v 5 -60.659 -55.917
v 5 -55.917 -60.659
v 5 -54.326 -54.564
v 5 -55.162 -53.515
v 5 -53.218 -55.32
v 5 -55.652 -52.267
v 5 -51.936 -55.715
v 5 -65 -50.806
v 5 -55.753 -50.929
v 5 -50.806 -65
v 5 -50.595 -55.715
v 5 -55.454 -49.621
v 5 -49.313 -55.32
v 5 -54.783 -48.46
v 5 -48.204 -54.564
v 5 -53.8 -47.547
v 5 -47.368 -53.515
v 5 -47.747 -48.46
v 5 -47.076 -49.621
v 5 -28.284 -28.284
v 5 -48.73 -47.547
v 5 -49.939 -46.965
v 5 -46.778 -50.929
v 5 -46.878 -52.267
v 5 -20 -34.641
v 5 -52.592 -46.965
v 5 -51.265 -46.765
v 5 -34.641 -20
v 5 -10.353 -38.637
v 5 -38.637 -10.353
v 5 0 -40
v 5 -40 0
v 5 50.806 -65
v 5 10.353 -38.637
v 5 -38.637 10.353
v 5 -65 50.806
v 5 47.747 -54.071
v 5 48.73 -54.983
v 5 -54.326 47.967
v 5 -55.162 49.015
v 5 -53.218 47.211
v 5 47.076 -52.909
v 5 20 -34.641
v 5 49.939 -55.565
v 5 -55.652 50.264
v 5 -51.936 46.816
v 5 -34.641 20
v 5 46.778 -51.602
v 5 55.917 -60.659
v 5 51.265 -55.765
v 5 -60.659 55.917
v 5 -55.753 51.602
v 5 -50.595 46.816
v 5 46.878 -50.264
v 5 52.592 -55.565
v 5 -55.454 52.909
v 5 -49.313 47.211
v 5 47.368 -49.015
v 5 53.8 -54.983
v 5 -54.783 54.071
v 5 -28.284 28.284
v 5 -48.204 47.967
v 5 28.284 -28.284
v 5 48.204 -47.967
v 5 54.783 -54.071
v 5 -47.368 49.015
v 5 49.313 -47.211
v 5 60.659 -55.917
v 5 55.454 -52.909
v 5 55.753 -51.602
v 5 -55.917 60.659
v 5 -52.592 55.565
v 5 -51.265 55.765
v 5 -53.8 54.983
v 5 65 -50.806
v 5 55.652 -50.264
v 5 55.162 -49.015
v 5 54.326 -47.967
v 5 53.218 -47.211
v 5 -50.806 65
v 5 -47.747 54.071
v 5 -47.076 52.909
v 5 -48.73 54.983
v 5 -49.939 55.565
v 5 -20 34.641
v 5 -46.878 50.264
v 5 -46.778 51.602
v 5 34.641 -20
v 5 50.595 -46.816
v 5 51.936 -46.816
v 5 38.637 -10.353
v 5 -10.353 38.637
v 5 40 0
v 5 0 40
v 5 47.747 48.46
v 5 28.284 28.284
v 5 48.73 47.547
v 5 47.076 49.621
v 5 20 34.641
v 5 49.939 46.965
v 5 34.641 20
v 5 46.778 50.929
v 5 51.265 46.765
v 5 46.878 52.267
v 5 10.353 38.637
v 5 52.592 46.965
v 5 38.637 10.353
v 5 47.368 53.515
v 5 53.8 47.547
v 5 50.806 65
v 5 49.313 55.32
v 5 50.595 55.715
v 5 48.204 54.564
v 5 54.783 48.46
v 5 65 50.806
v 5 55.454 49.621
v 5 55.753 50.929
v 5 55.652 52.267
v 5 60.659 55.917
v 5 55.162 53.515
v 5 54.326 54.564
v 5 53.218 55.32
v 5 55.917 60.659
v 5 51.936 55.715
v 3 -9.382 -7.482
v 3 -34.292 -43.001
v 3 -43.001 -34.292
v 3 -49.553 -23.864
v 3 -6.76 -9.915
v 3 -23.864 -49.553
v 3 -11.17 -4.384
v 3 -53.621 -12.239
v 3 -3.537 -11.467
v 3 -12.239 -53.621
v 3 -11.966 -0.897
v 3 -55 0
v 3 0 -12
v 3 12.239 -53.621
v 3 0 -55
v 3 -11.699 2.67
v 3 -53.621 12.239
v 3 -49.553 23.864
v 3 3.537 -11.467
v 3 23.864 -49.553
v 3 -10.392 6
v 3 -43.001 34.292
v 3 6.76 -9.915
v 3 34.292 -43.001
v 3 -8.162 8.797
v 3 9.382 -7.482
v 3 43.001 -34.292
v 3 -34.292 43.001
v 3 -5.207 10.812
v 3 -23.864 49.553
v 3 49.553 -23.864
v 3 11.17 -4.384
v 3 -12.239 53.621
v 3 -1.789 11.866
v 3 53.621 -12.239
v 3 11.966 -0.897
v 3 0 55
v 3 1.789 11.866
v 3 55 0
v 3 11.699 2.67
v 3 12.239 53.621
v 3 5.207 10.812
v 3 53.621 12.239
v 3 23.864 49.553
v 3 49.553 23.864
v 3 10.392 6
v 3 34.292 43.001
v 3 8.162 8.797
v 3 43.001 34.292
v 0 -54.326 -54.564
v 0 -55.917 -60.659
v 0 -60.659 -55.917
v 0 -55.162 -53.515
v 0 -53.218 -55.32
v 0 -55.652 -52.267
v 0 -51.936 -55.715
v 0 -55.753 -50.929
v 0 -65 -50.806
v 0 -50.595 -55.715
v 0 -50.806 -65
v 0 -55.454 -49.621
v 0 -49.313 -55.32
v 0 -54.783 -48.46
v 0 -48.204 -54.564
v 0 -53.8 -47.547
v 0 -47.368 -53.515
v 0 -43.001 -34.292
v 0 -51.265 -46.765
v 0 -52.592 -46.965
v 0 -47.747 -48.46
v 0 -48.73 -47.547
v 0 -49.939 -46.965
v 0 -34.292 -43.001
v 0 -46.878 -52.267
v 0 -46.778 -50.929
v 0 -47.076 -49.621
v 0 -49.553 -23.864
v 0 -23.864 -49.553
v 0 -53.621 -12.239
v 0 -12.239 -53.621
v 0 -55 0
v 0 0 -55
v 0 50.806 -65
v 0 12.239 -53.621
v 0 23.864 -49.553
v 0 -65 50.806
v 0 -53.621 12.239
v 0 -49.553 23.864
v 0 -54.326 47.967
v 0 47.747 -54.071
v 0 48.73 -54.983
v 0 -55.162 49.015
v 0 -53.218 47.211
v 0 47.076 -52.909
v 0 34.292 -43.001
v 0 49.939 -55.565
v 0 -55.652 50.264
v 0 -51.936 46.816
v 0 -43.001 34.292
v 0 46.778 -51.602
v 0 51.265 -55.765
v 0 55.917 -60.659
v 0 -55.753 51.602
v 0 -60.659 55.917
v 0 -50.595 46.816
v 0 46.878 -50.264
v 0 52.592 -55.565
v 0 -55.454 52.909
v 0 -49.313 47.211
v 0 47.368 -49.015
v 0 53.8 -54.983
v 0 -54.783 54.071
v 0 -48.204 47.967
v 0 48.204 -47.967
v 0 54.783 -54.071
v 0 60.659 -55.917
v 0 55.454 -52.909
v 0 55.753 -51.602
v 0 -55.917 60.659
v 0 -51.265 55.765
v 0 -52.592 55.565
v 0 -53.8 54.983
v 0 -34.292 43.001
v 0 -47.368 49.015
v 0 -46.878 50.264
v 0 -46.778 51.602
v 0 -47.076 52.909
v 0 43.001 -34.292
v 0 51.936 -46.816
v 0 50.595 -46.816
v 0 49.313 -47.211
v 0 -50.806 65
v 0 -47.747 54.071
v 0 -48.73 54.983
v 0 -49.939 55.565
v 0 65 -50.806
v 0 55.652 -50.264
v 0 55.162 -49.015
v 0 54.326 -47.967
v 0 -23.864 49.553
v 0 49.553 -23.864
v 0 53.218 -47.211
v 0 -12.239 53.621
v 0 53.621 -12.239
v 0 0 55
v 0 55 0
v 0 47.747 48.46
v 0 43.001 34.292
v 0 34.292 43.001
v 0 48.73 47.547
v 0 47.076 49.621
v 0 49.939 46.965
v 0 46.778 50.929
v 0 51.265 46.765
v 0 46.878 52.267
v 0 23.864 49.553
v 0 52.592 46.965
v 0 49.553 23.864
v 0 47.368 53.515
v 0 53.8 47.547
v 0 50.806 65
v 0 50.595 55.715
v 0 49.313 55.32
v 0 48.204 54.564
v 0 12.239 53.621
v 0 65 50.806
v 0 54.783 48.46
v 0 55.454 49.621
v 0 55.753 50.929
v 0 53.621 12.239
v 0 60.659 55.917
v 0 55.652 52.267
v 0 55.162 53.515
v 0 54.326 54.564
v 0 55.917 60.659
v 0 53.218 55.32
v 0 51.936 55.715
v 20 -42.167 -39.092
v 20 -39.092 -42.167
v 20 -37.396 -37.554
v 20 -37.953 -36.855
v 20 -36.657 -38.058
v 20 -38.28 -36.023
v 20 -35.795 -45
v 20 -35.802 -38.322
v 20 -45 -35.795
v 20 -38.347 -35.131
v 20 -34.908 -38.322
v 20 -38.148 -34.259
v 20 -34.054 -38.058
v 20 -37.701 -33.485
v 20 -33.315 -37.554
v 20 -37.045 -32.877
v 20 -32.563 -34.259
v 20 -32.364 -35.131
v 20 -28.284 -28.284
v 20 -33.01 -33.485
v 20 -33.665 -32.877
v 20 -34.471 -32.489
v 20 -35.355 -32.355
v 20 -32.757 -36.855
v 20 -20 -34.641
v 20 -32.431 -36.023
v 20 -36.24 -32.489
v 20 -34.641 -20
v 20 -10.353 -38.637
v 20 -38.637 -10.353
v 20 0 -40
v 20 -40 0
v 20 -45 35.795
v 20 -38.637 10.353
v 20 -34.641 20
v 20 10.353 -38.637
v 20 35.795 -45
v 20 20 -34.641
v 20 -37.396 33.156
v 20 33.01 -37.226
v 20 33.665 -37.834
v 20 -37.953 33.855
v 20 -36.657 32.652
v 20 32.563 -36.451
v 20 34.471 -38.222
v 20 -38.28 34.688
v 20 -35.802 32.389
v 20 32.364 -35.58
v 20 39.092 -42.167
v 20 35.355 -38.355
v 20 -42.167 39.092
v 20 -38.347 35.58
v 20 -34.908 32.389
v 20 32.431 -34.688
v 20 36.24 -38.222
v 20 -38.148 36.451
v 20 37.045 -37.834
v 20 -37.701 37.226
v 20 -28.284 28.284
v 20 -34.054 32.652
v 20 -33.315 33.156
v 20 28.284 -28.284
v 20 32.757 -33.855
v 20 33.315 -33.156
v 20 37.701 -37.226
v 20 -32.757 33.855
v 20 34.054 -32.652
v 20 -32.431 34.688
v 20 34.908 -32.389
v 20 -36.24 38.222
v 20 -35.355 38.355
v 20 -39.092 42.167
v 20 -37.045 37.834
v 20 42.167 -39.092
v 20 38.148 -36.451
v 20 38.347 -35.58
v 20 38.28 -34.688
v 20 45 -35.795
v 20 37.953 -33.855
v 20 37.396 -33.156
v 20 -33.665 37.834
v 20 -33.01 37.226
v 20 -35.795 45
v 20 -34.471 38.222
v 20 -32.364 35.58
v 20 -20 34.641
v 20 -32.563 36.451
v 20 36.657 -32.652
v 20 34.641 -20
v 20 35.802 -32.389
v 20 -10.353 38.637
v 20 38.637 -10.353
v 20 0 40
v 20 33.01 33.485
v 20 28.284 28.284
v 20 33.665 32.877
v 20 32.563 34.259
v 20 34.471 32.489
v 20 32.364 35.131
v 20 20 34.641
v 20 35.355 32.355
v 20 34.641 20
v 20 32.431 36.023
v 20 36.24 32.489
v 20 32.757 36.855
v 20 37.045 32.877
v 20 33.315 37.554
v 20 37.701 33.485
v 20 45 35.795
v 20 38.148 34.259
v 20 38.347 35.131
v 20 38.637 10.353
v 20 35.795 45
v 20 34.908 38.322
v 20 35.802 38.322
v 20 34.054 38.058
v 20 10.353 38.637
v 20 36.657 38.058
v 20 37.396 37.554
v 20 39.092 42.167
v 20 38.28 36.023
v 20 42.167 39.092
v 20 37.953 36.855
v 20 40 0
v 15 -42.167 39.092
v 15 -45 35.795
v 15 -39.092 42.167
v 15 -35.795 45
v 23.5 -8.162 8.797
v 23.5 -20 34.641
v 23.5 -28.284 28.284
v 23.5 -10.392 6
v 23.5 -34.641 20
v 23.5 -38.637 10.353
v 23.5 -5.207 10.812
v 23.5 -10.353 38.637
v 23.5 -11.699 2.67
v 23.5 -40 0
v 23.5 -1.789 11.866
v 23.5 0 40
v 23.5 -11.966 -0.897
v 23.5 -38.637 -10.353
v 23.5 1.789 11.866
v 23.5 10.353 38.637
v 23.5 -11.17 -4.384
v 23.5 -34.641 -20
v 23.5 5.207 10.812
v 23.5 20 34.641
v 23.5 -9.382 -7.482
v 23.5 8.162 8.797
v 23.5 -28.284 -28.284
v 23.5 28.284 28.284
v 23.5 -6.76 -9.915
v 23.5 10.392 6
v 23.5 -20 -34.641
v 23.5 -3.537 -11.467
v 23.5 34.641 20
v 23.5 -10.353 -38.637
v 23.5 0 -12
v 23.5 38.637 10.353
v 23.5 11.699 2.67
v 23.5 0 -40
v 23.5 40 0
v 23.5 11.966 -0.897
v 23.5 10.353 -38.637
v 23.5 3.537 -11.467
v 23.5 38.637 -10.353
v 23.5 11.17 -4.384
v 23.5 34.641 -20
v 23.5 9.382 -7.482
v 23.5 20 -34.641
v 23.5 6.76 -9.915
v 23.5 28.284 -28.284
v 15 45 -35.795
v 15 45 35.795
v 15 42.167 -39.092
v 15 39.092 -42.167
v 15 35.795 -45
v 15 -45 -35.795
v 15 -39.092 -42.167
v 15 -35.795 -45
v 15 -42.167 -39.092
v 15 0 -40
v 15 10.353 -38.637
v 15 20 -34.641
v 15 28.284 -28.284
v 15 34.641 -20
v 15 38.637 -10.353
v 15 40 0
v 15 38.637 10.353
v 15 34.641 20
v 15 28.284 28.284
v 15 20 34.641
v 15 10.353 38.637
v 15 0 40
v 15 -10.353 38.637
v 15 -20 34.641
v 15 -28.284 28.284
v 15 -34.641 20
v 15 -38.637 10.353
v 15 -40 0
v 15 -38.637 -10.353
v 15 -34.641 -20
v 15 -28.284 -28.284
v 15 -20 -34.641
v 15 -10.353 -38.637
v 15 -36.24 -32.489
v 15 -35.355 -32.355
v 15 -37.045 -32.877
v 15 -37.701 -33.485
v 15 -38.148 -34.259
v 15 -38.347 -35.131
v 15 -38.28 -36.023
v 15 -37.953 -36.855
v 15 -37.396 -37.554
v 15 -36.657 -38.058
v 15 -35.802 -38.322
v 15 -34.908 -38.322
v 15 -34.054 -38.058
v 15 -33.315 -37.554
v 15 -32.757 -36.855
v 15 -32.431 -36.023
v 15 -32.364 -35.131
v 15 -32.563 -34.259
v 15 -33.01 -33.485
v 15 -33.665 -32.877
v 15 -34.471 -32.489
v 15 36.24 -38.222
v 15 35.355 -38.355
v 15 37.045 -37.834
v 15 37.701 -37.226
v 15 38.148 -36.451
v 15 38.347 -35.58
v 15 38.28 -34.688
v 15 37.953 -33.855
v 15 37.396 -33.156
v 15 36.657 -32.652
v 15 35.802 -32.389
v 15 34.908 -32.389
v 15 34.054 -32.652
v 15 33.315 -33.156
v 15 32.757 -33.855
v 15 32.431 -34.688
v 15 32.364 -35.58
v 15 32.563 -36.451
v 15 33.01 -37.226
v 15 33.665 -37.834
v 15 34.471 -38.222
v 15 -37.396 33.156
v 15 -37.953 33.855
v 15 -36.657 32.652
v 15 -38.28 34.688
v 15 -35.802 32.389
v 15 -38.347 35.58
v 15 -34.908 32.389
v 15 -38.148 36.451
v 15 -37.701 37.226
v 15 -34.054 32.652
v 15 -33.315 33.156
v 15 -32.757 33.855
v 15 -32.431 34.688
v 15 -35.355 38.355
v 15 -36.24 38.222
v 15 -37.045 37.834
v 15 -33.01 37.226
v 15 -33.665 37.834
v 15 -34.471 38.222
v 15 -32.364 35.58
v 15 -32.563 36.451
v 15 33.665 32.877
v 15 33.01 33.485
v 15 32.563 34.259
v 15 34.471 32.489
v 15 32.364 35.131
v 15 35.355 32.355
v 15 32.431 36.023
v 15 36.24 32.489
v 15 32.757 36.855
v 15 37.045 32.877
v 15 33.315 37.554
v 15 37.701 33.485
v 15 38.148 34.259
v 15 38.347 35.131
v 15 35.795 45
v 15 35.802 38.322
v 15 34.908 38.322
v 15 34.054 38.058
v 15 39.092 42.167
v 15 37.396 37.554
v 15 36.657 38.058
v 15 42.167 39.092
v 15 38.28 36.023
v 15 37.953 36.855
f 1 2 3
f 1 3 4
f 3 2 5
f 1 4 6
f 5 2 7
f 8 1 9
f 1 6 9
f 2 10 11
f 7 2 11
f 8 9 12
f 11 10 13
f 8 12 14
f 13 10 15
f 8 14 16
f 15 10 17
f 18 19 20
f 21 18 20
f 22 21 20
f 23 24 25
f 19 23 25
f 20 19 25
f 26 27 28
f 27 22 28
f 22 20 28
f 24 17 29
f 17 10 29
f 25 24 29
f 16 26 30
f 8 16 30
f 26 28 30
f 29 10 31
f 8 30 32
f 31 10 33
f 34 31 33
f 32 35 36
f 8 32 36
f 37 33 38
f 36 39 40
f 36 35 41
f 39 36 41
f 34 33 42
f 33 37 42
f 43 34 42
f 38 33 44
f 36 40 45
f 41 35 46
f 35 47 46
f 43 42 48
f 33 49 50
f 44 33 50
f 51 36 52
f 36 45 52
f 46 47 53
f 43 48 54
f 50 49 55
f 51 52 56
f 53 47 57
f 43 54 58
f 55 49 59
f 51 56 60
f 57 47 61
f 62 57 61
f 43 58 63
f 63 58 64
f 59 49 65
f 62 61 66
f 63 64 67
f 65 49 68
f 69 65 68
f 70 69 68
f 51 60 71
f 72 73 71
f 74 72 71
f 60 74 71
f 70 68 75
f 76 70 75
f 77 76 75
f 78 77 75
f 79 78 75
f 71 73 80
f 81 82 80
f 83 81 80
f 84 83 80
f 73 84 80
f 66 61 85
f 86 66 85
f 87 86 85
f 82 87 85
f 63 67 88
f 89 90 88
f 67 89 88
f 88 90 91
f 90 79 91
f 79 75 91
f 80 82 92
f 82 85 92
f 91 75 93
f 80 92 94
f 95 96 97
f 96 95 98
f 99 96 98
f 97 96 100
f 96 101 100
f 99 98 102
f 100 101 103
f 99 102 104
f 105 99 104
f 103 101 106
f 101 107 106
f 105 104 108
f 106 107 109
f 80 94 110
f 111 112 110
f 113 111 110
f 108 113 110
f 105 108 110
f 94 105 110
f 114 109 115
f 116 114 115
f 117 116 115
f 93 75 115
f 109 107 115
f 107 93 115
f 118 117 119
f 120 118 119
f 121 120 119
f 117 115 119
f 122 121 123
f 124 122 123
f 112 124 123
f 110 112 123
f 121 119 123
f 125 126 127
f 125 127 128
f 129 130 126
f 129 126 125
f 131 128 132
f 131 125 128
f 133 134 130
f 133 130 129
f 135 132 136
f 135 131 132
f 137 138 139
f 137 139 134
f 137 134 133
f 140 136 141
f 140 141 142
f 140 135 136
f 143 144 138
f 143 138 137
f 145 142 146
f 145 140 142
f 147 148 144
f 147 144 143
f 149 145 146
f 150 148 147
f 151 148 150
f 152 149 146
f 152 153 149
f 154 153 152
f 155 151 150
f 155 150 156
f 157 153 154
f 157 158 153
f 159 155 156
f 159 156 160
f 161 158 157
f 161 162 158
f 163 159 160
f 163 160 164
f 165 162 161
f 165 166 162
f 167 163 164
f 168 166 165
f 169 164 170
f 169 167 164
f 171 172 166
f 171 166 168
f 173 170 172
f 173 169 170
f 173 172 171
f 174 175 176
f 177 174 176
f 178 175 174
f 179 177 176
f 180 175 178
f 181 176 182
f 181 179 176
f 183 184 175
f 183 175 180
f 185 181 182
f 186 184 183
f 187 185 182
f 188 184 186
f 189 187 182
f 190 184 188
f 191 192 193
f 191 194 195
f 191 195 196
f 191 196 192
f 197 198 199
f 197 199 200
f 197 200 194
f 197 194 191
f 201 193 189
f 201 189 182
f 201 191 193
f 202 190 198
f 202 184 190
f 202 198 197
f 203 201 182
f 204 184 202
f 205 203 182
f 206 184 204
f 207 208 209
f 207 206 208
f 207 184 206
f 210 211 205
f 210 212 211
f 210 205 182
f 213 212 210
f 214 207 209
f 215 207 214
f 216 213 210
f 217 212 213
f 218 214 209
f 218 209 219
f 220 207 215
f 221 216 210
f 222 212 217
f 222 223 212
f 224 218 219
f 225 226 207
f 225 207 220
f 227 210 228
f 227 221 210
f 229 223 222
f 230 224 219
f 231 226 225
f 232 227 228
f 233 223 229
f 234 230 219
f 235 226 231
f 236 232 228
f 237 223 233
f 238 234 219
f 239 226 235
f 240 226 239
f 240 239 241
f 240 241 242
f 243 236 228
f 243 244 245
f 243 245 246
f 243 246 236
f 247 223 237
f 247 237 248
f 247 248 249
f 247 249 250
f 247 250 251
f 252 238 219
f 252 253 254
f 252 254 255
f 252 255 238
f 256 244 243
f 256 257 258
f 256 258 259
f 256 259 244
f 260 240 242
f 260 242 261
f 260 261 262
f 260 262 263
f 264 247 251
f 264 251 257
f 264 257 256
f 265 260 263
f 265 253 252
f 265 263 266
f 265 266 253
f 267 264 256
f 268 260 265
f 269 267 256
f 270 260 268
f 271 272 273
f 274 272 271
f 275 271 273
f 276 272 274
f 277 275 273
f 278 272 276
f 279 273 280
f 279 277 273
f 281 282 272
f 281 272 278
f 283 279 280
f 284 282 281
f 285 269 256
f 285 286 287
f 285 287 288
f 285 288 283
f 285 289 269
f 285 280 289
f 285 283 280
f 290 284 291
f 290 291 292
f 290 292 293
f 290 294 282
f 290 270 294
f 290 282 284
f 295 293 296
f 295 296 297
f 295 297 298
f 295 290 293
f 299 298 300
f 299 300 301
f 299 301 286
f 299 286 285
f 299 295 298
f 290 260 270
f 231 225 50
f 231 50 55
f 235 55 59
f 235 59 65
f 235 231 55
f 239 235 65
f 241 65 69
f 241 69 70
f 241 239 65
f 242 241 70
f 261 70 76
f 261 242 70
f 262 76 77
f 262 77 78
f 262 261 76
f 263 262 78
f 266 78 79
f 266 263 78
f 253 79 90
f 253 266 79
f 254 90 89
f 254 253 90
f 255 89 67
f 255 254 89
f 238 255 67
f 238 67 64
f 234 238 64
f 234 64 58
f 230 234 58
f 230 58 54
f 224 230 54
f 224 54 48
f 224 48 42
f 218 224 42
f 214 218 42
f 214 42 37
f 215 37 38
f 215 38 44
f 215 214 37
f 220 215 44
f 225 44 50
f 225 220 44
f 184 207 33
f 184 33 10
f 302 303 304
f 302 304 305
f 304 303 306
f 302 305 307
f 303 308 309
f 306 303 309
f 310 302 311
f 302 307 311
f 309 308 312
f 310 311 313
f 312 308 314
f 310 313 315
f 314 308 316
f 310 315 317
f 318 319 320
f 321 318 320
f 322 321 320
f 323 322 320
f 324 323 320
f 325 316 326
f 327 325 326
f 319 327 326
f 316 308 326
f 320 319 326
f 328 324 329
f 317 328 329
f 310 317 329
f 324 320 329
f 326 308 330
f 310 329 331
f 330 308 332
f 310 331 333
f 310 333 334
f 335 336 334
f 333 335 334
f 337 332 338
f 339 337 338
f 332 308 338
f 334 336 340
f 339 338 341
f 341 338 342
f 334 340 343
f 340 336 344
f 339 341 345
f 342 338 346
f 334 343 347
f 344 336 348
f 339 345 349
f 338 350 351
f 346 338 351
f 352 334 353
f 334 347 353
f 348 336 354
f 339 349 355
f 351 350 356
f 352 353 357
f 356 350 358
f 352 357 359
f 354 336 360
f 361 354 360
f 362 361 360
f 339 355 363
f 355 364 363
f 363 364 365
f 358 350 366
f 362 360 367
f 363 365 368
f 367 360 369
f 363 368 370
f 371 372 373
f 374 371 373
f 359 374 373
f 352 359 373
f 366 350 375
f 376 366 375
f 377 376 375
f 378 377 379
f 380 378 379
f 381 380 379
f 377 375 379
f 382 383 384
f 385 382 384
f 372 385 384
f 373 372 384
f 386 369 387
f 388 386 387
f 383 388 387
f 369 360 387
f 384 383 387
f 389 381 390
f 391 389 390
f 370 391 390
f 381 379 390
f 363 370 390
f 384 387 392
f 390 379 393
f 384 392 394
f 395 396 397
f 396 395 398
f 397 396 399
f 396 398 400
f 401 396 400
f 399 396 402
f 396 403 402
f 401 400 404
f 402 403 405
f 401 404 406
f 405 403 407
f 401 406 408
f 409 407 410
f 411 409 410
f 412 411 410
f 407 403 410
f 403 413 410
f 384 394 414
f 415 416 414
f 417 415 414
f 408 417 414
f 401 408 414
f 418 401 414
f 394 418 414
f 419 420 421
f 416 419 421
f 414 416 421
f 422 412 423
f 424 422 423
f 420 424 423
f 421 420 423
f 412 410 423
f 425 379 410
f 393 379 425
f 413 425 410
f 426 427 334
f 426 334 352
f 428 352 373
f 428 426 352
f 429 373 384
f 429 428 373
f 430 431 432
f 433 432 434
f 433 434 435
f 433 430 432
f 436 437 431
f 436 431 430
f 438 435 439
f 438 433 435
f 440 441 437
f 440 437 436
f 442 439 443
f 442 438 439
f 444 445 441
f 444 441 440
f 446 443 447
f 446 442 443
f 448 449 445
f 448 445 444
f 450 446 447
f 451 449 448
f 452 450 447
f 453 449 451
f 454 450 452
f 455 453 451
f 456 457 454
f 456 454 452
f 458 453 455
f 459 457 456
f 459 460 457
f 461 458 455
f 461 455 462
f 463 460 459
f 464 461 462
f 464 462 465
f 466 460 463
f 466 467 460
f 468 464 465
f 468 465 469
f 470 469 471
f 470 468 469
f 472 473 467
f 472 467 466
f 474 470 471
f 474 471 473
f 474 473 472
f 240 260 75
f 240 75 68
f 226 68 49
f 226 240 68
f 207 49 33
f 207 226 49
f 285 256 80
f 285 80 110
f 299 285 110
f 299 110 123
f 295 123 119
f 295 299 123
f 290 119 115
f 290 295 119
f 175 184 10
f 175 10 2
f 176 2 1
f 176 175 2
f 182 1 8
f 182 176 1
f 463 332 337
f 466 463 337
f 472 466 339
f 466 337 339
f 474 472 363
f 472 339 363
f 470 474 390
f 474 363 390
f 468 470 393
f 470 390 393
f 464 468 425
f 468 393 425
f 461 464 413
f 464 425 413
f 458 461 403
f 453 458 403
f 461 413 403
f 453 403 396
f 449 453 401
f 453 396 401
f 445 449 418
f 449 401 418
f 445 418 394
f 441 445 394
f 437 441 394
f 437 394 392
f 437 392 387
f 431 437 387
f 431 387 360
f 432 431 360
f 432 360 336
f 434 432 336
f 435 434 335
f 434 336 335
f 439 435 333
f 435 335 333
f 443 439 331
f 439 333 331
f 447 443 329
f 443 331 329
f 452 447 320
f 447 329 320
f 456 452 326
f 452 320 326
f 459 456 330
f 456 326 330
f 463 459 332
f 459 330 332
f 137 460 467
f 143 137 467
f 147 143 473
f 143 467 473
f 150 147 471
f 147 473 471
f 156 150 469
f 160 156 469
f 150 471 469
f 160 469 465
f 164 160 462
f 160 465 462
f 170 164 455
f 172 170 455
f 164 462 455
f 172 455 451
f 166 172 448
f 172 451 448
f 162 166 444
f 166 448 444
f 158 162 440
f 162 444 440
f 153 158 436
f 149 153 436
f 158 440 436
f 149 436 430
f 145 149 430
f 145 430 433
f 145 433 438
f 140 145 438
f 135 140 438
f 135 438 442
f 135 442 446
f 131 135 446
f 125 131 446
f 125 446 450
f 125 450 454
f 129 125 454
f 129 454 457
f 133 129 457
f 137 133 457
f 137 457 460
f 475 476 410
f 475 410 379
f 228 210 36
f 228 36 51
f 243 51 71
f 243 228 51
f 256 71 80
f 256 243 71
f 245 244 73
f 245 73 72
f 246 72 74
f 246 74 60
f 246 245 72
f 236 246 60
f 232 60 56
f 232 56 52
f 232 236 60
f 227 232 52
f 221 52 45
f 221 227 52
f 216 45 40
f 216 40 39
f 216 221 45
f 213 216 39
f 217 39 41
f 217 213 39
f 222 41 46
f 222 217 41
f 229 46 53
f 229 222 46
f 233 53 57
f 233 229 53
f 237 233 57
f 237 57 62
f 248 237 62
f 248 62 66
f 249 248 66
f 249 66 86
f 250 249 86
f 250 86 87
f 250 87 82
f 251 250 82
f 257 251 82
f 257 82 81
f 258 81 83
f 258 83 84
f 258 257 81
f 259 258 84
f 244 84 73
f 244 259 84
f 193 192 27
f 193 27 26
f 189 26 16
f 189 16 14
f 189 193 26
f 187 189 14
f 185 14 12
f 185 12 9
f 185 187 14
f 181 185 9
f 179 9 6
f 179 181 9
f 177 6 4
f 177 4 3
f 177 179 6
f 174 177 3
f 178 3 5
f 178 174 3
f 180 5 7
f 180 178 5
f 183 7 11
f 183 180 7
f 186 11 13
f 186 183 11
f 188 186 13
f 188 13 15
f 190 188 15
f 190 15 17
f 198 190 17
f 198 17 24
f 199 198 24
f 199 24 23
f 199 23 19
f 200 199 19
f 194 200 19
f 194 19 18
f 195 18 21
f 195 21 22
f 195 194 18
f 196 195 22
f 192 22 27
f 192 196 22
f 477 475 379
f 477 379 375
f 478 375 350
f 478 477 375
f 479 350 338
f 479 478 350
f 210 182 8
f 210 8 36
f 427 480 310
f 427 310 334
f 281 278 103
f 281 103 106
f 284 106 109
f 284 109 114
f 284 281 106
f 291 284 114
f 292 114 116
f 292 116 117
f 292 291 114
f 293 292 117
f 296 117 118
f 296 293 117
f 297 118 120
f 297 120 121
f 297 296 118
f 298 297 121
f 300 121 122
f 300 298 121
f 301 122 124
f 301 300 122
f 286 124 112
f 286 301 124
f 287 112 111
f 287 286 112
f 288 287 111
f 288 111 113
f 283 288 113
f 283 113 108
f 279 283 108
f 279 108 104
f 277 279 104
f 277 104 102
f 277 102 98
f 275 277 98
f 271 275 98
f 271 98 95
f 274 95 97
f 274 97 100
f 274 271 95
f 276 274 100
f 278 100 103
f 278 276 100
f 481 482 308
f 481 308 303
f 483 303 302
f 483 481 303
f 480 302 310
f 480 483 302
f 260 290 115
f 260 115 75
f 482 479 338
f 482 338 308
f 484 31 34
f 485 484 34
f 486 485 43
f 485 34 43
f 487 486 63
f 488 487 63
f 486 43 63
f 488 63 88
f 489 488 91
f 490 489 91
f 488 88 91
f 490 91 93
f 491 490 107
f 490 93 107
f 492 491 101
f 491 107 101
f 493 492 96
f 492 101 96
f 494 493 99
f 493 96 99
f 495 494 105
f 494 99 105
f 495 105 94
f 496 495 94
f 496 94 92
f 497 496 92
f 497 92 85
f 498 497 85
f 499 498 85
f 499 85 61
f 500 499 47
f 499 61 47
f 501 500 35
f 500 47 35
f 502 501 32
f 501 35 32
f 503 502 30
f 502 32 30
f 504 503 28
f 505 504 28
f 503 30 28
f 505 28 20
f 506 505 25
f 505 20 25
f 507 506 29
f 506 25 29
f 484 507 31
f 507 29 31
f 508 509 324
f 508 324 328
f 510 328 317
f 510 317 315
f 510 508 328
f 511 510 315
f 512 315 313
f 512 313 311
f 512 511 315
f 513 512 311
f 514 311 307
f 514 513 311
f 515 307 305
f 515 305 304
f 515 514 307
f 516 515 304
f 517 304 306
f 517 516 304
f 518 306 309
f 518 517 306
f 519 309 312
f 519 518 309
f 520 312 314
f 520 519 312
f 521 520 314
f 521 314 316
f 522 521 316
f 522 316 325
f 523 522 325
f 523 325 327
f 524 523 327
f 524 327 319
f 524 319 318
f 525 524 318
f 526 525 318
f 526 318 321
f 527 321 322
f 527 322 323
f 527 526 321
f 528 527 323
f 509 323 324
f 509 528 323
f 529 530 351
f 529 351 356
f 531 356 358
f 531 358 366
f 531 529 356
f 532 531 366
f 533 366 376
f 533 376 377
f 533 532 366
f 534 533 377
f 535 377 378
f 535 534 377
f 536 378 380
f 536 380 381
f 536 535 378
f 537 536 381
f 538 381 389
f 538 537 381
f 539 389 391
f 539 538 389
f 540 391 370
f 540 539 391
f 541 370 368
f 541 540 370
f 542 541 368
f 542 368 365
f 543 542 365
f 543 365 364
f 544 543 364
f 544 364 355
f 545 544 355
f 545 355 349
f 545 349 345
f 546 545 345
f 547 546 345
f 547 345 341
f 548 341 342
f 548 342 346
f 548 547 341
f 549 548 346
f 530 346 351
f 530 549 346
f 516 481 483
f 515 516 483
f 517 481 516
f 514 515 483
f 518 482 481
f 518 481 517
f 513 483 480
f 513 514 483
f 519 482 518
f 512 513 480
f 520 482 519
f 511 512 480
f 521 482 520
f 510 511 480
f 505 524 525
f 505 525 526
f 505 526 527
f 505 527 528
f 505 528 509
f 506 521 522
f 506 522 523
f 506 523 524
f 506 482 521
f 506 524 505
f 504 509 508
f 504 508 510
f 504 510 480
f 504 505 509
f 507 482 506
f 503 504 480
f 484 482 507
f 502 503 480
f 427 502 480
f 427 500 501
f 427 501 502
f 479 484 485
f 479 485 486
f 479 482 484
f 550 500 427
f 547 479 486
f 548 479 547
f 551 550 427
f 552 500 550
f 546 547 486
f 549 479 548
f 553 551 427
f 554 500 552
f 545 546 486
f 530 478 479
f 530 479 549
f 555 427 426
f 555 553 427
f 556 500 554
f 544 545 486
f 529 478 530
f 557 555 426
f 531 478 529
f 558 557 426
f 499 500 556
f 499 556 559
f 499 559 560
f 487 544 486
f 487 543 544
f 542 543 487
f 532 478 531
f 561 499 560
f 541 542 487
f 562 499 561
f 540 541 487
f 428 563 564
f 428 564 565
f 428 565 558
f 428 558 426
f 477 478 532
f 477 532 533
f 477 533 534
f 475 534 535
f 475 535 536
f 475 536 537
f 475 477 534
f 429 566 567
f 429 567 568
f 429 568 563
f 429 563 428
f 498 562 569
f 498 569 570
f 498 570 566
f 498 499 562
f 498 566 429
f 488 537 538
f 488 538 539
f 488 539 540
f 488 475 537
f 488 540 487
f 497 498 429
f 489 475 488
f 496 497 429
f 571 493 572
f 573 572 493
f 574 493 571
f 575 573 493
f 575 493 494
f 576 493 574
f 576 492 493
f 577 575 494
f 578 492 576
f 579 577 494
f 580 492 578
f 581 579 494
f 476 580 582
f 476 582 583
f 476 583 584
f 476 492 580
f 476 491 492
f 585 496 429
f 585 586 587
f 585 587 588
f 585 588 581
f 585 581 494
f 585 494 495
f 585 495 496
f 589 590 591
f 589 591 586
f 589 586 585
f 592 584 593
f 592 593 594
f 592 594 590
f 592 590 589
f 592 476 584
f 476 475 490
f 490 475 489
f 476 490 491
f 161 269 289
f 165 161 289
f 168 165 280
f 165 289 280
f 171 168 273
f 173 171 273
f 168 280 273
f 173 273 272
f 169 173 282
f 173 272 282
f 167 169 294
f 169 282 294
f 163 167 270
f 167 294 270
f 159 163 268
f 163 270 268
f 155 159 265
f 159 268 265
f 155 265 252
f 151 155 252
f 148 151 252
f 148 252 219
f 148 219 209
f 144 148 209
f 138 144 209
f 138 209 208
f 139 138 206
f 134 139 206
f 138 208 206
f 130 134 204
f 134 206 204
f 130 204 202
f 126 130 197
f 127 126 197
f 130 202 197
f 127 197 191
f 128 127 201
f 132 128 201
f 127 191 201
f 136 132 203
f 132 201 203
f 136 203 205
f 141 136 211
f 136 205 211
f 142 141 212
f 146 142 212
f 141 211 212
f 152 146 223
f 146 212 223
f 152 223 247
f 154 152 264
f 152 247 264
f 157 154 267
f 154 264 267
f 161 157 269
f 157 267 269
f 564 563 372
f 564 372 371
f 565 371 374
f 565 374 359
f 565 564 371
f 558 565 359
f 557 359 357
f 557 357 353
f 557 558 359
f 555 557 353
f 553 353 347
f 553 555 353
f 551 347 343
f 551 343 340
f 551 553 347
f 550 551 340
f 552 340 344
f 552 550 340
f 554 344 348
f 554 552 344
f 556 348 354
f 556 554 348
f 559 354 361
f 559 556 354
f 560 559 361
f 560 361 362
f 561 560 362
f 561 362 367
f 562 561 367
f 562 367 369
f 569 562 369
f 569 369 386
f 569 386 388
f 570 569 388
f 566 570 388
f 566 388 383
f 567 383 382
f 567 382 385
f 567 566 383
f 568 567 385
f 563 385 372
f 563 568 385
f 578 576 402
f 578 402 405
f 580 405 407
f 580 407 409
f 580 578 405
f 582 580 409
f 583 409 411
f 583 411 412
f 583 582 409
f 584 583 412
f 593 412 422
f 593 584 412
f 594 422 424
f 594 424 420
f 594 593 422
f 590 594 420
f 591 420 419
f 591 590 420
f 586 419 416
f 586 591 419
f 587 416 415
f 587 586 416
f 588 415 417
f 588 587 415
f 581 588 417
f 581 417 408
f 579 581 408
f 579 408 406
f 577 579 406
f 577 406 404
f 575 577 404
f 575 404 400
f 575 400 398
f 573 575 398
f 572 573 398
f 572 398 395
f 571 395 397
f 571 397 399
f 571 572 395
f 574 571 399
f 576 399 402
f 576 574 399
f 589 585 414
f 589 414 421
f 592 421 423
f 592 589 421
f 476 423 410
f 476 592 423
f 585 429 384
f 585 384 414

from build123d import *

# Parameters (mm, degrees)
SKETCH_1_R          = 4.5
EXTRUDE_1_DEPTH     = 5
SKETCH_2_R          = 55
CUT_EXTRUDE_1_DEPTH = 3
SKETCH_3_R          = 40
EXTRUDE_2_DEPTH     = 10
SKETCH_4_R          = 3
EXTRUDE_3_DEPTH     = 5
SKETCH_5_R          = 40
EXTRUDE_4_DEPTH     = 3.5
SKETCH_6_R          = 12
CUT_EXTRUDE_2_DEPTH = 95.880187605


with BuildPart() as part:
    # 草图1 → 凸台-拉伸1 (new body)
    with BuildSketch(Plane(origin=(0, 0, 0), x_dir=(0, 0, -1), z_dir=(1, 0, 0))):
        with BuildLine():
            Line((50.806003582, -65), (-50.806003582, -65))
            ThreePointArc((-50.806003582, -65), (-58.336309448, -58.336309448), (-65, -50.806003582))
            Line((-65, -50.806003582), (-65, 50.806003582))
            ThreePointArc((-65, 50.806003582), (-58.336309448, 58.336309448), (-50.806003582, 65))
            Line((-50.806003582, 65), (50.806003582, 65))
            ThreePointArc((50.806003582, 65), (58.336309448, 58.336309448), (65, 50.806003582))
            Line((65, 50.806003582), (65, -50.806003582))
            ThreePointArc((65, -50.806003582), (58.336309448, -58.336309448), (50.806003582, -65))
        make_face()
        with Locations((-51.265241636, 51.265241636)):
            Circle(SKETCH_1_R, mode=Mode.SUBTRACT)
        with Locations(Location((51.265241636, -51.265241636, 0), (0, 0, 180))):
            Circle(SKETCH_1_R, mode=Mode.SUBTRACT)
        with Locations((51.265241636, 51.265241636)):
            Circle(SKETCH_1_R, mode=Mode.SUBTRACT)
        with Locations(Location((-51.265241636, -51.265241636, 0), (0, 0, 180))):
            Circle(SKETCH_1_R, mode=Mode.SUBTRACT)
    extrude(amount=EXTRUDE_1_DEPTH)

    # 草图2 → 切除-拉伸1 (cut)
    with BuildSketch(Plane.ZY):
        Circle(SKETCH_2_R)
    extrude(amount=-CUT_EXTRUDE_1_DEPTH, mode=Mode.SUBTRACT)

    # 草图3 → 凸台-拉伸2 (add)
    with BuildSketch(Plane(origin=(5, 0, 0), x_dir=(0, 0, -1), z_dir=(1, 0, 0))):
        Circle(SKETCH_3_R)
    extrude(amount=EXTRUDE_2_DEPTH)

    # 草图4 → 凸台-拉伸3 (add)
    with BuildSketch(Plane(origin=(15, 0, 0), x_dir=(0, 0, -1), z_dir=(1, 0, 0))):
        with BuildLine():
            Line((35.794552658, -45), (-35.794552658, -45))
            ThreePointArc((-35.794552658, -45), (-40.658639918, -40.658639918), (-45, -35.794552658))
            Line((-45, -35.794552658), (-45, 35.794552658))
            ThreePointArc((-45, 35.794552658), (-40.658639918, 40.658639918), (-35.794552658, 45))
            Line((-35.794552658, 45), (35.794552658, 45))
            ThreePointArc((35.794552658, 45), (40.658639918, 40.658639918), (45, 35.794552658))
            Line((45, 35.794552658), (45, -35.794552658))
            ThreePointArc((45, -35.794552658), (40.658639918, -40.658639918), (35.794552658, -45))
        make_face()
        with Locations((-35.355339059, 35.355339059)):
            Circle(SKETCH_4_R, mode=Mode.SUBTRACT)
        with Locations(Location((35.355339059, -35.355339059, 0), (0, 0, 180))):
            Circle(SKETCH_4_R, mode=Mode.SUBTRACT)
        with Locations((35.355339059, 35.355339059)):
            Circle(SKETCH_4_R, mode=Mode.SUBTRACT)
        with Locations(Location((-35.355339059, -35.355339059, 0), (0, 0, 180))):
            Circle(SKETCH_4_R, mode=Mode.SUBTRACT)
    extrude(amount=EXTRUDE_3_DEPTH)

    # 草图5 → 凸台-拉伸4 (add)
    with BuildSketch(Plane(origin=(20, 0, 0), x_dir=(0, 0, -1), z_dir=(1, 0, 0))):
        Circle(SKETCH_5_R)
    extrude(amount=EXTRUDE_4_DEPTH)

    # 草图6 → 切除-拉伸2 (cut, through all)
    with BuildSketch(Plane(origin=(23.5, 0, 0), x_dir=(0, 0, -1), z_dir=(1, 0, 0))):
        Circle(SKETCH_6_R)
    extrude(amount=-CUT_EXTRUDE_2_DEPTH, mode=Mode.SUBTRACT)


solid = part.part
